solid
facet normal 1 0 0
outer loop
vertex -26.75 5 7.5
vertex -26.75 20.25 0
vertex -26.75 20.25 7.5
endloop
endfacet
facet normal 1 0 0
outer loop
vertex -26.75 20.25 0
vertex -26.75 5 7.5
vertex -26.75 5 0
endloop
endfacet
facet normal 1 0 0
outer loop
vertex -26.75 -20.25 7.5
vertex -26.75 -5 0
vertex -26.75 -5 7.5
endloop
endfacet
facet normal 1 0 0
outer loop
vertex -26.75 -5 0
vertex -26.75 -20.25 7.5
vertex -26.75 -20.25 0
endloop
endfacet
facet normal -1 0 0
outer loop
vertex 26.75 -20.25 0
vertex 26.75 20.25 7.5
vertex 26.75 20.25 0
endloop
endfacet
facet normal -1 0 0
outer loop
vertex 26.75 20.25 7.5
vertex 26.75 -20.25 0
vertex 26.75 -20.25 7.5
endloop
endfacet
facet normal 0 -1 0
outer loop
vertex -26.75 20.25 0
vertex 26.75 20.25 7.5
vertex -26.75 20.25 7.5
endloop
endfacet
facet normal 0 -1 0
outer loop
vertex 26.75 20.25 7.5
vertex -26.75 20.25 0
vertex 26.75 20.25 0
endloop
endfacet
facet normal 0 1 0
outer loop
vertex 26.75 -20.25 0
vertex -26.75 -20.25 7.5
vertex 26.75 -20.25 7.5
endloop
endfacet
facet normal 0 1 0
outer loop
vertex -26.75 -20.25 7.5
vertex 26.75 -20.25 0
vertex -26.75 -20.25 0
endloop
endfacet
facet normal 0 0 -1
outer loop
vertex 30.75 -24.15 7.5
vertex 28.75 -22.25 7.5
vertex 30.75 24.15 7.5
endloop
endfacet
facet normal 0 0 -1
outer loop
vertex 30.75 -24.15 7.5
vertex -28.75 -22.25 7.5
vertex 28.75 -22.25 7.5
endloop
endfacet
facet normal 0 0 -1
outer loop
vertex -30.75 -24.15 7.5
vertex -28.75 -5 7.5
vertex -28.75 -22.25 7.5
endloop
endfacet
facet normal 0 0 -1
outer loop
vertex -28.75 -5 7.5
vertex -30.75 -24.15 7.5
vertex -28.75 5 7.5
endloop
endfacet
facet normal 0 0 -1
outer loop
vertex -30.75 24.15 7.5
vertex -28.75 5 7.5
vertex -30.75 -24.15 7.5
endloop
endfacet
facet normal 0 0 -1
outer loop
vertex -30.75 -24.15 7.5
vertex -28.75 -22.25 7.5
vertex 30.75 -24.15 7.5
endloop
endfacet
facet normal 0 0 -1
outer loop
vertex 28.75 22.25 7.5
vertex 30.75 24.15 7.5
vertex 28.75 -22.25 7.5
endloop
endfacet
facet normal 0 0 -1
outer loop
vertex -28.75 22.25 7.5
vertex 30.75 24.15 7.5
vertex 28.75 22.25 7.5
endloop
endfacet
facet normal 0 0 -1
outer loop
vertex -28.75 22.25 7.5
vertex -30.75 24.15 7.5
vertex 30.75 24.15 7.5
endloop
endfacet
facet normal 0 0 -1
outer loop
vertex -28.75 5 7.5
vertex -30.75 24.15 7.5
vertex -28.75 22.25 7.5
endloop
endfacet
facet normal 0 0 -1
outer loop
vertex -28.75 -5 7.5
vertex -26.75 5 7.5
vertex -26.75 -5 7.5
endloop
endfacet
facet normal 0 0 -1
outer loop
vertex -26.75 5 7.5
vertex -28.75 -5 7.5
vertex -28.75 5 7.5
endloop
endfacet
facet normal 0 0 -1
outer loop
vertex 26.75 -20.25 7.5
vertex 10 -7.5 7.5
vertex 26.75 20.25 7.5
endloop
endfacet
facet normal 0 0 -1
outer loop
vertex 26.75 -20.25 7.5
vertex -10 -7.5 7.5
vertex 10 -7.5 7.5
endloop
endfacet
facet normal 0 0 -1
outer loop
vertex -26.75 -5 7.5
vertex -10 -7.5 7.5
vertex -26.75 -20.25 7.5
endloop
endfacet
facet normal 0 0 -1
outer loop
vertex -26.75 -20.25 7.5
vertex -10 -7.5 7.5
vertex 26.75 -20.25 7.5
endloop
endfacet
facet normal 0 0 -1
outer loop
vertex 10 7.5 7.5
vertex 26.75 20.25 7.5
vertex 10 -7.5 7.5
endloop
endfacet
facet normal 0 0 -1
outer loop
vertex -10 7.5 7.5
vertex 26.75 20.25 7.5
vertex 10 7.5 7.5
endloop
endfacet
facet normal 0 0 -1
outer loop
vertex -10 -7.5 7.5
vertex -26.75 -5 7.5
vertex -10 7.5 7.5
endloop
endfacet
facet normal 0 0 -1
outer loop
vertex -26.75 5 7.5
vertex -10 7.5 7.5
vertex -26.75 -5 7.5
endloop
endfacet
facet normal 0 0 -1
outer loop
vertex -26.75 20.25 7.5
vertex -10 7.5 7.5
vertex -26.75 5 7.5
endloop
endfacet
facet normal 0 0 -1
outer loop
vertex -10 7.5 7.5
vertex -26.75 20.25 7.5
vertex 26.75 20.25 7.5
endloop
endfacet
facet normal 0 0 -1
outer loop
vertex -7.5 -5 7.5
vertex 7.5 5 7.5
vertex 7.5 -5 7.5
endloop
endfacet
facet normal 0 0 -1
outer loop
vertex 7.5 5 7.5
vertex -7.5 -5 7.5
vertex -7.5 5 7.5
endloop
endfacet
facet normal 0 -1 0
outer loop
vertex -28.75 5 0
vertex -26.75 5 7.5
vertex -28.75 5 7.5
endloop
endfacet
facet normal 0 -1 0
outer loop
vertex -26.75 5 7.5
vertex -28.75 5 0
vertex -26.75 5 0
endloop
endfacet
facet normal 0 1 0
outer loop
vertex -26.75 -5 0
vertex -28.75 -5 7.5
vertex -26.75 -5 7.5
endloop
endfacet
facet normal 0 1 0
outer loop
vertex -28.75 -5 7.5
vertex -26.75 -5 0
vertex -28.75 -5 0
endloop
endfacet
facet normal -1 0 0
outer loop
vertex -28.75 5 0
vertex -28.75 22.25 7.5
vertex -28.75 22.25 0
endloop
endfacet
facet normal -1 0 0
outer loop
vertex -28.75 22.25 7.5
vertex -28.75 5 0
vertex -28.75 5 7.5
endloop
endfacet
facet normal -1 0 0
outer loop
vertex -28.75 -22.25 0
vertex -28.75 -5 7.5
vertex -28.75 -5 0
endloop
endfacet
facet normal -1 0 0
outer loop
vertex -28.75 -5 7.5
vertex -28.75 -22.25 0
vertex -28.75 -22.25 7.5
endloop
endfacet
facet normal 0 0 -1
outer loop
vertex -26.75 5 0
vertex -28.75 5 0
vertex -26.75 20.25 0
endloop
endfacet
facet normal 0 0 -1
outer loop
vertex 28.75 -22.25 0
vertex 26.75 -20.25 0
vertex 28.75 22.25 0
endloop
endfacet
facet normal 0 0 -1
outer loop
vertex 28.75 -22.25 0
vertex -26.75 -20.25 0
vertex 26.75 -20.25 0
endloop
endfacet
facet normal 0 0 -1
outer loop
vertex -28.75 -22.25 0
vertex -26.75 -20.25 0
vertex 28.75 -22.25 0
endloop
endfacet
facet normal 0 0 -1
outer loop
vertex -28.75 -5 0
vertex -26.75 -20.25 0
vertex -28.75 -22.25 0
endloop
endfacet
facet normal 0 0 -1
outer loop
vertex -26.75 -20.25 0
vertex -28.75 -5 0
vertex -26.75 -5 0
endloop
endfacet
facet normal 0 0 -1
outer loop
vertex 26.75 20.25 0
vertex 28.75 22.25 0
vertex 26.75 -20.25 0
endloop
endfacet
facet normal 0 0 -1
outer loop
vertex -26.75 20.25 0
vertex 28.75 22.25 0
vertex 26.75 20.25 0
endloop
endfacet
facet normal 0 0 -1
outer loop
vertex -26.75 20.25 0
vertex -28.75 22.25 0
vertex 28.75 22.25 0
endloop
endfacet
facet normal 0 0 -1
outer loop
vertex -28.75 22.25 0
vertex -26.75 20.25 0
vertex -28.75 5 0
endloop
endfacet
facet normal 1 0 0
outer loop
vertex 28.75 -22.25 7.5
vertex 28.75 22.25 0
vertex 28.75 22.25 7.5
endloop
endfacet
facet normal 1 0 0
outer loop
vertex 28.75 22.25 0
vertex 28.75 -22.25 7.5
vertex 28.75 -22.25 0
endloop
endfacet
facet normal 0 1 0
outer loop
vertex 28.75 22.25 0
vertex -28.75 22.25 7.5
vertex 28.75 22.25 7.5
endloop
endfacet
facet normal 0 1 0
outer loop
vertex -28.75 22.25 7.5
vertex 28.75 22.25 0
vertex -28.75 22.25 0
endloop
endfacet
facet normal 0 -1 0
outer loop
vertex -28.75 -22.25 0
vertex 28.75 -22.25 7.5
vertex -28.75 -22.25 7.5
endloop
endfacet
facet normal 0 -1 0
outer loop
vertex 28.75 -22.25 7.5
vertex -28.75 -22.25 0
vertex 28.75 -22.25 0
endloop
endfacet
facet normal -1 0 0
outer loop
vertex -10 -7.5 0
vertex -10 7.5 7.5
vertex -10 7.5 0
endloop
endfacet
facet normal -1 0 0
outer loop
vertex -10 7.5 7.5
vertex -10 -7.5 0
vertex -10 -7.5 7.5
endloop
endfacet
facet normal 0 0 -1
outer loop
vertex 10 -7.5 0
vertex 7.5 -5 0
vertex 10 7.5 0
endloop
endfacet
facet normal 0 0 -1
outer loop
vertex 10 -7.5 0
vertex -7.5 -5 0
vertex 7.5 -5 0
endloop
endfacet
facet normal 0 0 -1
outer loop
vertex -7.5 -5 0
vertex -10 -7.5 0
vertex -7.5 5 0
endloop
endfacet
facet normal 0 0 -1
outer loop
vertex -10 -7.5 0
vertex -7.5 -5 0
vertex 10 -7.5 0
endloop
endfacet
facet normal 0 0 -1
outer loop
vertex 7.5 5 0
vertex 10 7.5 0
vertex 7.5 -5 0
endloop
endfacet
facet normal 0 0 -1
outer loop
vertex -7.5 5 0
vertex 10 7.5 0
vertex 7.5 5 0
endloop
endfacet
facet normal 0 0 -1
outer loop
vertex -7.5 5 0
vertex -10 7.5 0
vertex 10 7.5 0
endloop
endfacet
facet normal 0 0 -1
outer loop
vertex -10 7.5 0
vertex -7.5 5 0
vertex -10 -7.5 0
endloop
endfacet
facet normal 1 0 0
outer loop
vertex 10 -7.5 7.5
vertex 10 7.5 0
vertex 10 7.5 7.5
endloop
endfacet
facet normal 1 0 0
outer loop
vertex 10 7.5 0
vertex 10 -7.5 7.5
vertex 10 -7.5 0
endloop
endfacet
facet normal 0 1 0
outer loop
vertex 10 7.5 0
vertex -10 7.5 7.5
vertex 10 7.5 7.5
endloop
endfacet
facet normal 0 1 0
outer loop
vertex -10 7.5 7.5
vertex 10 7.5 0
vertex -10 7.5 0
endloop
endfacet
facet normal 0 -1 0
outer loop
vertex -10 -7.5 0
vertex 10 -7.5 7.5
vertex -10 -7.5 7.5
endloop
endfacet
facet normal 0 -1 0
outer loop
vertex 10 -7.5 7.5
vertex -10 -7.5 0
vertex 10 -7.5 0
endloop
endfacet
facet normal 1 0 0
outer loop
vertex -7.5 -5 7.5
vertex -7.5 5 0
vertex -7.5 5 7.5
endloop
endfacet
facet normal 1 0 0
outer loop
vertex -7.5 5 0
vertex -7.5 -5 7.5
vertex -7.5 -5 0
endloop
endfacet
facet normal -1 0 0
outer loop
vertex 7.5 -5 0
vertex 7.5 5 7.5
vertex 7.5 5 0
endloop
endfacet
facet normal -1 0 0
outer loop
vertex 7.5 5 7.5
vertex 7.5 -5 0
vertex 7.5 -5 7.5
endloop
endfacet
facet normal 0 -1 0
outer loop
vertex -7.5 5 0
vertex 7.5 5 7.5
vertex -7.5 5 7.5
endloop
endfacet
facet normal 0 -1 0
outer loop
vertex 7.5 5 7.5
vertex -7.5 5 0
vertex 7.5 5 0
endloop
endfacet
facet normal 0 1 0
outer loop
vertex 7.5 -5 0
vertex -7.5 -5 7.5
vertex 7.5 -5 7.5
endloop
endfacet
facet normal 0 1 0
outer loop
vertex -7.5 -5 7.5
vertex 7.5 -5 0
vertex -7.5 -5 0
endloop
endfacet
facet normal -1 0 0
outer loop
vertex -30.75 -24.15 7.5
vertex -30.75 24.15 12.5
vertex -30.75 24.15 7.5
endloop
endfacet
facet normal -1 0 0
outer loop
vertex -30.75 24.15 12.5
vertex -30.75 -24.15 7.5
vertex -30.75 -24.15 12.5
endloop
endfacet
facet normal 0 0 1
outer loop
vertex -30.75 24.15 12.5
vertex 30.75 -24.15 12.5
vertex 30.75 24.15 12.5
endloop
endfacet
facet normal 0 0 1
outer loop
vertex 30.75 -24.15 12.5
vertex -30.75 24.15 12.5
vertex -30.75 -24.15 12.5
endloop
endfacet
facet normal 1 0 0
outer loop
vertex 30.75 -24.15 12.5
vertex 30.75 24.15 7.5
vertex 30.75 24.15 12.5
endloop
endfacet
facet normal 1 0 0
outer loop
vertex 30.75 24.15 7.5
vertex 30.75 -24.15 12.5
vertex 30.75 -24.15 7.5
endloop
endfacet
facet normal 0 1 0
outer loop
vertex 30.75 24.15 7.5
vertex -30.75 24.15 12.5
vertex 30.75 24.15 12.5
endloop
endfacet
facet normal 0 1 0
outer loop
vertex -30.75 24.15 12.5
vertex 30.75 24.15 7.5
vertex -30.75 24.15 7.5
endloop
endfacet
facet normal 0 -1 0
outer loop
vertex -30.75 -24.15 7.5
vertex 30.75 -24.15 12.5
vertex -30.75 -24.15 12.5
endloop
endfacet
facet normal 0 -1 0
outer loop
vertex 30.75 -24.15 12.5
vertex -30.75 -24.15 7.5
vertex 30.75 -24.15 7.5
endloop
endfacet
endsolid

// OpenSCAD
translate([0,0,10]) {
rotate([0,180,0]) {


union() {
translate([0,0,5]) {
	difference() {
		cube(size=[57.5,44.5,10], center=true);
		union() {
			cube(size=[53.5, 40.5,11], center=true);
			translate([30,0,3]) cube(size=[16.5,10,11],center=true);
		}
	}
	difference() {
		cube(size=[20,15,10], center=true);
		cube(size=[15,10,10.1], center=true);
	}
}
cube(size=[61.5,48.3,5], center=true);
}

rotate([0,0,180]) translate([-25,-25,-6]) scale([.5,.5,0]) linear_extrude(height=5) import("uncodin-icon.dxf");

}
}
